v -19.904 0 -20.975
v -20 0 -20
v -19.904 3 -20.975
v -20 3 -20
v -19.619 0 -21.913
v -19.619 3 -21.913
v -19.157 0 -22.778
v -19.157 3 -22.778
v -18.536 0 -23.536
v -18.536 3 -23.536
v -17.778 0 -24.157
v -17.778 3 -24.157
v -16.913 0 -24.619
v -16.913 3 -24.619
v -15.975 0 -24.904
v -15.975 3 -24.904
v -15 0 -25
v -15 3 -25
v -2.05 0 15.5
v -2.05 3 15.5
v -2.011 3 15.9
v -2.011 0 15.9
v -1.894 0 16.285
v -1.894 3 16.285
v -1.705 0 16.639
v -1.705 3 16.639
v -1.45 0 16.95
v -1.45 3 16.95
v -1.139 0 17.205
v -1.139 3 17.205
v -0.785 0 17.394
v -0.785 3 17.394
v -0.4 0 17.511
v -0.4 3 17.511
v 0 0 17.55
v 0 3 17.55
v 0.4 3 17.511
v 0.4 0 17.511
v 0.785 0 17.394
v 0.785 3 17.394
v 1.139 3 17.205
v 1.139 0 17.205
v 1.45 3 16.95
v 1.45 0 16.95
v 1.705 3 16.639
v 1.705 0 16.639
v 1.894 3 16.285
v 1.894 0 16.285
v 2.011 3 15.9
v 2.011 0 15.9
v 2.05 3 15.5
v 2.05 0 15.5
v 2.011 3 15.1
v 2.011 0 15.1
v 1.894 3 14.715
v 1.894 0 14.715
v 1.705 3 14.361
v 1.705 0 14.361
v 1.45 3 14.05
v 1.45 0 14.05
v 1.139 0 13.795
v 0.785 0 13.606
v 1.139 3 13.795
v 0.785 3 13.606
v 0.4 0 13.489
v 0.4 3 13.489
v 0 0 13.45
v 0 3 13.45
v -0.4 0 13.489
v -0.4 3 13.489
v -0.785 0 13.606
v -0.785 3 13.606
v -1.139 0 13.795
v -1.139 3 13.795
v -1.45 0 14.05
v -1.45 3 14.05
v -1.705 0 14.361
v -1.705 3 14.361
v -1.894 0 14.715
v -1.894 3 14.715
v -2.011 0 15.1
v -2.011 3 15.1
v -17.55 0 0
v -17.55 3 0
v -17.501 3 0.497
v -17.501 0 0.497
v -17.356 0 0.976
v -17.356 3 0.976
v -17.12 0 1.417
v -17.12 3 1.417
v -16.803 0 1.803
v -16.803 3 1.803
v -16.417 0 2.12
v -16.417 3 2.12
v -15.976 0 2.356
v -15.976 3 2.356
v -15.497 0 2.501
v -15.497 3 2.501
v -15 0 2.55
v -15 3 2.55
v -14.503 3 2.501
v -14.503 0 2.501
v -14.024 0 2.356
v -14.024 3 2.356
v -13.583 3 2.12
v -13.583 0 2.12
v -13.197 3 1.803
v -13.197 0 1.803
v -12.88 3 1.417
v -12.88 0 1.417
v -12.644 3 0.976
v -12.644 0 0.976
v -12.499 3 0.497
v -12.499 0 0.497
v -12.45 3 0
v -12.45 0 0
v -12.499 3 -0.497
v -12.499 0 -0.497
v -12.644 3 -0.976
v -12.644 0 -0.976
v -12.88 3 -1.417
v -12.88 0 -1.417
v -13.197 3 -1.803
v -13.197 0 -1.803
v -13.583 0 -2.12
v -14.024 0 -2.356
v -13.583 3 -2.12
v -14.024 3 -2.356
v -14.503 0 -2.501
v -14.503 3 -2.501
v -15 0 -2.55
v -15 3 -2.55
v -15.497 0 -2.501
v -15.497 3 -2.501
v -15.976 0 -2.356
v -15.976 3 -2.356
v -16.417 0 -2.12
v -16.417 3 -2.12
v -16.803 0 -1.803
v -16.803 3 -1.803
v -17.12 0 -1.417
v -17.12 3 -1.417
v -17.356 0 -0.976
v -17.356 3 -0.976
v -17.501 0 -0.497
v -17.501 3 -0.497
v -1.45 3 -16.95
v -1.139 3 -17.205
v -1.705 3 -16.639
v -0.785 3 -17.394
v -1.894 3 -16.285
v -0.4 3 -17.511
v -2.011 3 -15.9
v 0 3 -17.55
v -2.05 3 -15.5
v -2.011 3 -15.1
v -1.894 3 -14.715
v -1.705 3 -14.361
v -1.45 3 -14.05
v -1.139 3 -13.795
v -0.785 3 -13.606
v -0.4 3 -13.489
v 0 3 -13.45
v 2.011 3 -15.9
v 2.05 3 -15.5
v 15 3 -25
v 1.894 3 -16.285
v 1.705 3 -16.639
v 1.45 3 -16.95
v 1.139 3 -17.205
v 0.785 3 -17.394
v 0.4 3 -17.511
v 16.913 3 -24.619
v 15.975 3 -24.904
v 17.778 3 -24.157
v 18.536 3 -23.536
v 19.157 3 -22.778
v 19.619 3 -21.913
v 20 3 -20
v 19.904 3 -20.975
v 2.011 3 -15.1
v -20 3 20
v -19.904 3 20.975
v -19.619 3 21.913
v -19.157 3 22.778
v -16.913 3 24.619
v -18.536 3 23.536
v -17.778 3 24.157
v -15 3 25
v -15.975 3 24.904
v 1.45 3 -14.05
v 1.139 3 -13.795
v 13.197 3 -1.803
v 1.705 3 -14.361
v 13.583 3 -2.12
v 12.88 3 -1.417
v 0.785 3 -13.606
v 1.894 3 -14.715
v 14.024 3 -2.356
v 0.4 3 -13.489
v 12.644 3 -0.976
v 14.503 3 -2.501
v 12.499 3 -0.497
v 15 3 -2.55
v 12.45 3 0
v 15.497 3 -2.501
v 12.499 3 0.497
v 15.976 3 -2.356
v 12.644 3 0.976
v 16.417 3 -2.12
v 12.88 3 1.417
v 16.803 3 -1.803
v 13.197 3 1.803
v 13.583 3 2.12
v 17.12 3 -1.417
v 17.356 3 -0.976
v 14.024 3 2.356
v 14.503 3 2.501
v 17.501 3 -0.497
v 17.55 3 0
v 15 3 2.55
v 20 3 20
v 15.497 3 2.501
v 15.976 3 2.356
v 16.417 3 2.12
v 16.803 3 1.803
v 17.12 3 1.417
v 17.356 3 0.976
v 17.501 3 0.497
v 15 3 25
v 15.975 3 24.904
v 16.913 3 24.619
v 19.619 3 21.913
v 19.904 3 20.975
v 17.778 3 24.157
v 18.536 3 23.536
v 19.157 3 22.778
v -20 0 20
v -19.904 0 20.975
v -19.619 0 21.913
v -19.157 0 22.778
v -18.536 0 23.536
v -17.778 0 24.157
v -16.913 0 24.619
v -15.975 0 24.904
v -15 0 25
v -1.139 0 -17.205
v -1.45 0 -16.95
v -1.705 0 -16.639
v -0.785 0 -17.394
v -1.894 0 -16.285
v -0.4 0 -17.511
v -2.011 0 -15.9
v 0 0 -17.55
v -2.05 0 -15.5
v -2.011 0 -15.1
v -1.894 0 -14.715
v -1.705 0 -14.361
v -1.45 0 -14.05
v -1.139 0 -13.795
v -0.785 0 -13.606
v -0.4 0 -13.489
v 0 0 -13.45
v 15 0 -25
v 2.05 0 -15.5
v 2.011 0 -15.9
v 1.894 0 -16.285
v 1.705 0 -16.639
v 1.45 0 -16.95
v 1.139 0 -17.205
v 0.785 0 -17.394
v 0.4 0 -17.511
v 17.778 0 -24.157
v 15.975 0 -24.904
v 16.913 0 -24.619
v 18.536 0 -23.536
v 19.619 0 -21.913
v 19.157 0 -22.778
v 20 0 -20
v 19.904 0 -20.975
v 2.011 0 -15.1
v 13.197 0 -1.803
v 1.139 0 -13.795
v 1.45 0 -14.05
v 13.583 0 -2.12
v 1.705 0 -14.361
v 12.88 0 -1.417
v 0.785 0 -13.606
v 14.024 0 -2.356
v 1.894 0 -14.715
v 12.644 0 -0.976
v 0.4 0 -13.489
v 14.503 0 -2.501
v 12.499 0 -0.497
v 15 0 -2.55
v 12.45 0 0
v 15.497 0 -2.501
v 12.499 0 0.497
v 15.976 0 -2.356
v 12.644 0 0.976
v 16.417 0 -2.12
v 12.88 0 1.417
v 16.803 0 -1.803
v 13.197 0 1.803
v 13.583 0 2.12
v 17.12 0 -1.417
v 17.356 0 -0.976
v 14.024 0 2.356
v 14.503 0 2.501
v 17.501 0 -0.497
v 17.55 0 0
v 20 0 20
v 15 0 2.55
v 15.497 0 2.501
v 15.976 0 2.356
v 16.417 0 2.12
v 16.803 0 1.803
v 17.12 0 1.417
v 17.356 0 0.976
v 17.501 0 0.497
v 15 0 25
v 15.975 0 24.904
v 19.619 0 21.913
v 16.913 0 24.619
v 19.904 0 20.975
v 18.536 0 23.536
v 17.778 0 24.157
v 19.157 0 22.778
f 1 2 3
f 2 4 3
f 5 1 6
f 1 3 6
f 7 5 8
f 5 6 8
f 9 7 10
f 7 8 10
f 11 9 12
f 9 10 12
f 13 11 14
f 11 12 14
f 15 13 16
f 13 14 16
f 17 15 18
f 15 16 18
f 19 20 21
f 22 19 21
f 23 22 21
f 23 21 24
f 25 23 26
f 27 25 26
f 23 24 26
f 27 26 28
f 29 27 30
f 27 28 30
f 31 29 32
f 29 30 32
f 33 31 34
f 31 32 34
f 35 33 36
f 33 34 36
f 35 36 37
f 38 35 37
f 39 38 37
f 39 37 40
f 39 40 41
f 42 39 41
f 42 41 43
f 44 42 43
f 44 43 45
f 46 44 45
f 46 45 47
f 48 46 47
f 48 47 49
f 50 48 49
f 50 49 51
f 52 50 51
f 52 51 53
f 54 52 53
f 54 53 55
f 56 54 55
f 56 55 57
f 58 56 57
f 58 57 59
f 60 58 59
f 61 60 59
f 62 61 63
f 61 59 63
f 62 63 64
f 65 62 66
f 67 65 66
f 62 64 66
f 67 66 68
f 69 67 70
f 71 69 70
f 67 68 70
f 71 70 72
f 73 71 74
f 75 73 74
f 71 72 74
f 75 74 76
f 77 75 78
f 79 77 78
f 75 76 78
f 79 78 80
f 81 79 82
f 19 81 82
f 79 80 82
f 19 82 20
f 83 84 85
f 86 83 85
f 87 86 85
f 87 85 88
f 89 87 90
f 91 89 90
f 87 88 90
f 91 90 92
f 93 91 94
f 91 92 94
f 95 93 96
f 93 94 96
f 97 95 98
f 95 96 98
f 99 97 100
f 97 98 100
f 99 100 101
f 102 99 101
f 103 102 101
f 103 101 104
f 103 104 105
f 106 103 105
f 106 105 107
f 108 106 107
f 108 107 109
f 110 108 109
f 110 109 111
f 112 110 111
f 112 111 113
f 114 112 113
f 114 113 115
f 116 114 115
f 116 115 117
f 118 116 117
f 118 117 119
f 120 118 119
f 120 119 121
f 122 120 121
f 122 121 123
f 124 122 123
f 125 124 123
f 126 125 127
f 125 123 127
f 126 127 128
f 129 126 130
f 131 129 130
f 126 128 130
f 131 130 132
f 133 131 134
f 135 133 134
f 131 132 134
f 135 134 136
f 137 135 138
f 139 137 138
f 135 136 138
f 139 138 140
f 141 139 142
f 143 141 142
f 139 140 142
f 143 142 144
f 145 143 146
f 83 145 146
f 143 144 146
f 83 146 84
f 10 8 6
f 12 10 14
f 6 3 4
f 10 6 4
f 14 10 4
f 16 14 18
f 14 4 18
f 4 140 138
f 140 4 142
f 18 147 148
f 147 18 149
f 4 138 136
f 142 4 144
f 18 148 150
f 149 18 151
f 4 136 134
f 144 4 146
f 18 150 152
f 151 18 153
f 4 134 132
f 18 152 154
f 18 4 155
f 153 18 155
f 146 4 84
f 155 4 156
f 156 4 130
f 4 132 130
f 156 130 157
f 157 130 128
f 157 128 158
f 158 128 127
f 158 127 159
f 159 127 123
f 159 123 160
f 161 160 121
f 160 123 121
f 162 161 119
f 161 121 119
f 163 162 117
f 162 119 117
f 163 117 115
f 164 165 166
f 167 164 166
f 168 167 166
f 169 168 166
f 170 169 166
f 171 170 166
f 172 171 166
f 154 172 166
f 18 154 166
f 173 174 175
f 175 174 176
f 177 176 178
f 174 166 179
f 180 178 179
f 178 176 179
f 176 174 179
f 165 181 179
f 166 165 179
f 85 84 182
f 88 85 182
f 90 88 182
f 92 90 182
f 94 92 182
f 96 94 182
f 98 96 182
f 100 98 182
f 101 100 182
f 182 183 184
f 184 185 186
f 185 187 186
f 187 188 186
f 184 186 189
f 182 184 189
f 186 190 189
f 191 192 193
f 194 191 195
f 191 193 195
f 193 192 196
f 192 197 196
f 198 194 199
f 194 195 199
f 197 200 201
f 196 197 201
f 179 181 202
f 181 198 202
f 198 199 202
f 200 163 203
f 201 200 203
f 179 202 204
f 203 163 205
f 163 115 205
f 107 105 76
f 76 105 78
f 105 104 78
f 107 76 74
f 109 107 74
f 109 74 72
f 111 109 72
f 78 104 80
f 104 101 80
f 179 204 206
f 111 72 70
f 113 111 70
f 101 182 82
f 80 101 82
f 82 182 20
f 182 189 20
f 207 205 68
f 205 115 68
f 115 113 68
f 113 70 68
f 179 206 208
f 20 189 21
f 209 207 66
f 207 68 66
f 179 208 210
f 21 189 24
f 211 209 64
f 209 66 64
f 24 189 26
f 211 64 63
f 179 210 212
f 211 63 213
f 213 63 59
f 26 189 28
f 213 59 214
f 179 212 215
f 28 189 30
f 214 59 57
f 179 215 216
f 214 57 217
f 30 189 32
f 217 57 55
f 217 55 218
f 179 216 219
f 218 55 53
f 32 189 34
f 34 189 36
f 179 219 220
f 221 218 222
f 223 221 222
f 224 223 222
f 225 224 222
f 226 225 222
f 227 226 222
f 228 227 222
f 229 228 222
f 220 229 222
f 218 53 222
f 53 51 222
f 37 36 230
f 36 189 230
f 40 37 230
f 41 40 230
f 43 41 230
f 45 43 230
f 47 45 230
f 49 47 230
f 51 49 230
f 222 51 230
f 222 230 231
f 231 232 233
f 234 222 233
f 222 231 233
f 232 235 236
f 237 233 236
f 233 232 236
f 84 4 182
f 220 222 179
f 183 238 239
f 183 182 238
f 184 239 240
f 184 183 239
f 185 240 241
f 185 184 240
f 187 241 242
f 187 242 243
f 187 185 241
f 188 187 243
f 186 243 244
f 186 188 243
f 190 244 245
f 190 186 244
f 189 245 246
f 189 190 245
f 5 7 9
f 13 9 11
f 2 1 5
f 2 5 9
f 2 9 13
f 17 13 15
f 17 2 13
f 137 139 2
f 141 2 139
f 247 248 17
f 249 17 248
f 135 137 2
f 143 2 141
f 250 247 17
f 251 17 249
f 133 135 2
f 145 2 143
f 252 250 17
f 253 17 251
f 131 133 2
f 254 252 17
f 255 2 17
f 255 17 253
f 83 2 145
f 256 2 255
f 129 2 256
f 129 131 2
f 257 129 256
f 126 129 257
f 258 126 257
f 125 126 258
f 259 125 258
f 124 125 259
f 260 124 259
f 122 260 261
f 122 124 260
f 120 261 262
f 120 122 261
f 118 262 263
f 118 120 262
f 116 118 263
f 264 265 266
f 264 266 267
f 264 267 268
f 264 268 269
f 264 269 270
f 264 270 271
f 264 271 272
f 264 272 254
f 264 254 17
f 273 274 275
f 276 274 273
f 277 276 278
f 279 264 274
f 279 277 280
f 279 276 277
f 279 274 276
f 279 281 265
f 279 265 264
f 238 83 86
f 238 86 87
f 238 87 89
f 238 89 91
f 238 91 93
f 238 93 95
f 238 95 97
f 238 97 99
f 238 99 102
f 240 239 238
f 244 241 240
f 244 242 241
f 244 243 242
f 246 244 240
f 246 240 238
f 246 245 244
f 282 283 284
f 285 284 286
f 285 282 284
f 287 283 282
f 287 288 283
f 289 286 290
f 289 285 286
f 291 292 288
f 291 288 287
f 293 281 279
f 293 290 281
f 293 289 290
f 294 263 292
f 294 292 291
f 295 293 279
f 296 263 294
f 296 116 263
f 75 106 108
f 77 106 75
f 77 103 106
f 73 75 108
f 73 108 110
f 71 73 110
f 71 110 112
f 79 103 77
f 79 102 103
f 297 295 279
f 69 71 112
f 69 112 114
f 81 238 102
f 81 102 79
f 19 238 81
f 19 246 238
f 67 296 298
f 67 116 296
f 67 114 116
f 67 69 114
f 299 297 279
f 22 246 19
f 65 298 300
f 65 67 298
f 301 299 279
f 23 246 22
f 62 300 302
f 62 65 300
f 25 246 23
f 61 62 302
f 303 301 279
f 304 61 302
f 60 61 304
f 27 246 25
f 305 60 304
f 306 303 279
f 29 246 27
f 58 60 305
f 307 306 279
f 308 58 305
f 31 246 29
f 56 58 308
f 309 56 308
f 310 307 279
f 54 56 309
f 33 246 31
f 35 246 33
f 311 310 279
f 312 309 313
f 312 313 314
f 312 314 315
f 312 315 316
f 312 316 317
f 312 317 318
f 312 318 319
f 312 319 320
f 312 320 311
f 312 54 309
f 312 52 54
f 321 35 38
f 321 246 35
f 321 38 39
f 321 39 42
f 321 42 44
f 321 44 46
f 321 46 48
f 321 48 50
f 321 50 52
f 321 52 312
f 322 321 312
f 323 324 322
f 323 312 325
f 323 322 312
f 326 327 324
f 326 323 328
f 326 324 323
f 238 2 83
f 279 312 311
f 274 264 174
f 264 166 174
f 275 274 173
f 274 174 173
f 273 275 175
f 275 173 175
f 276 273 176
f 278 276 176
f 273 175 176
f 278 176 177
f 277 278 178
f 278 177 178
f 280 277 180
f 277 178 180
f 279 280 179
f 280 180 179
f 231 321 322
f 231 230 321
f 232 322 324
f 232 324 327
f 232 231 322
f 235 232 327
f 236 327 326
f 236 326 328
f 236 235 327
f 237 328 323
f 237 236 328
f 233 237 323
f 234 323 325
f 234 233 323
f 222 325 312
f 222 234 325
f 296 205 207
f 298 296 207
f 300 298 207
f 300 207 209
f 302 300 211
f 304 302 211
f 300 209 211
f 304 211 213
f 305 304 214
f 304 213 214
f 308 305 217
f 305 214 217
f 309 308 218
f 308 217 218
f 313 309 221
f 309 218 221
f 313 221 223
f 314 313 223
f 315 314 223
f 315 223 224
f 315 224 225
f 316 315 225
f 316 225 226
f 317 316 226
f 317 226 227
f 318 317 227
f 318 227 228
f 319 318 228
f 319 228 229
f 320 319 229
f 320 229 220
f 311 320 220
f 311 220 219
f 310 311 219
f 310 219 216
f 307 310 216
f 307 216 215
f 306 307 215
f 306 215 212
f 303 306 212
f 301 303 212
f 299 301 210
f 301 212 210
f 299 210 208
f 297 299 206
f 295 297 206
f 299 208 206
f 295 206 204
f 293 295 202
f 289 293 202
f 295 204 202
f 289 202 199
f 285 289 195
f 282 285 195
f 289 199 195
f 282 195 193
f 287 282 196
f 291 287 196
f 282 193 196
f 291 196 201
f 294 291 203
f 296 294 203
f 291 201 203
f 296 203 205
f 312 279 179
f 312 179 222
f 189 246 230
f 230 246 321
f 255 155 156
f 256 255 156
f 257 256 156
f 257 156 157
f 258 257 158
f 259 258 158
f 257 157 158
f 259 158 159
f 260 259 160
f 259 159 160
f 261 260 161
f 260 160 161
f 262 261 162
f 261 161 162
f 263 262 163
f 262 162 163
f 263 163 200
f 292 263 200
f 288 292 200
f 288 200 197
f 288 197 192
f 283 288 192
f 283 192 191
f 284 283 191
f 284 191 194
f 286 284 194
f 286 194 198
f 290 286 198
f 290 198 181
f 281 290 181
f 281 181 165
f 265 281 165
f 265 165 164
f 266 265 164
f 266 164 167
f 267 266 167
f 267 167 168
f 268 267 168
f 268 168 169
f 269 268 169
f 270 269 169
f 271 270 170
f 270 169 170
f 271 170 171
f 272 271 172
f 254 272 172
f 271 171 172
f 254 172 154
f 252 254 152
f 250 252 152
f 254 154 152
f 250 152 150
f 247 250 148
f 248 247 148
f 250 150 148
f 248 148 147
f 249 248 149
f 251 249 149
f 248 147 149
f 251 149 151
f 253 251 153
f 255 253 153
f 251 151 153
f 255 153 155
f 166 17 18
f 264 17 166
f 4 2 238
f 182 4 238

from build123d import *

# Parameters (mm, degrees)
F0_W     = 40
F0_H     = 50
F1_DEPTH = 3
F3_D     = 4.1
F4_D     = 5.1
F5_R     = 5


with BuildPart() as f1:
    # F0 (on Front) → F1 (new body)
    with BuildSketch(Plane.XZ):
        Rectangle(F0_W, F0_H)
    extrude(amount=-F1_DEPTH)

    # F3 (through all)
    with Locations(Plane.XZ):
        with Locations((0, 15.5), (0, -15.5)):
            Hole(F3_D / 2)

    # F4 (through all)
    with Locations(Plane.XZ):
        with Locations((-15, 0), (15, 0)):
            Hole(F4_D / 2)

    # F5
    f5_edges = [f1.edges().sort_by_distance(p)[0] for p in [
        (20, 1.5, 25),
        (20, 1.5, -25),
        (-20, 1.5, -25),
        (-20, 1.5, 25),
    ]]
    fillet(f5_edges, radius=F5_R)


solid = f1.part
